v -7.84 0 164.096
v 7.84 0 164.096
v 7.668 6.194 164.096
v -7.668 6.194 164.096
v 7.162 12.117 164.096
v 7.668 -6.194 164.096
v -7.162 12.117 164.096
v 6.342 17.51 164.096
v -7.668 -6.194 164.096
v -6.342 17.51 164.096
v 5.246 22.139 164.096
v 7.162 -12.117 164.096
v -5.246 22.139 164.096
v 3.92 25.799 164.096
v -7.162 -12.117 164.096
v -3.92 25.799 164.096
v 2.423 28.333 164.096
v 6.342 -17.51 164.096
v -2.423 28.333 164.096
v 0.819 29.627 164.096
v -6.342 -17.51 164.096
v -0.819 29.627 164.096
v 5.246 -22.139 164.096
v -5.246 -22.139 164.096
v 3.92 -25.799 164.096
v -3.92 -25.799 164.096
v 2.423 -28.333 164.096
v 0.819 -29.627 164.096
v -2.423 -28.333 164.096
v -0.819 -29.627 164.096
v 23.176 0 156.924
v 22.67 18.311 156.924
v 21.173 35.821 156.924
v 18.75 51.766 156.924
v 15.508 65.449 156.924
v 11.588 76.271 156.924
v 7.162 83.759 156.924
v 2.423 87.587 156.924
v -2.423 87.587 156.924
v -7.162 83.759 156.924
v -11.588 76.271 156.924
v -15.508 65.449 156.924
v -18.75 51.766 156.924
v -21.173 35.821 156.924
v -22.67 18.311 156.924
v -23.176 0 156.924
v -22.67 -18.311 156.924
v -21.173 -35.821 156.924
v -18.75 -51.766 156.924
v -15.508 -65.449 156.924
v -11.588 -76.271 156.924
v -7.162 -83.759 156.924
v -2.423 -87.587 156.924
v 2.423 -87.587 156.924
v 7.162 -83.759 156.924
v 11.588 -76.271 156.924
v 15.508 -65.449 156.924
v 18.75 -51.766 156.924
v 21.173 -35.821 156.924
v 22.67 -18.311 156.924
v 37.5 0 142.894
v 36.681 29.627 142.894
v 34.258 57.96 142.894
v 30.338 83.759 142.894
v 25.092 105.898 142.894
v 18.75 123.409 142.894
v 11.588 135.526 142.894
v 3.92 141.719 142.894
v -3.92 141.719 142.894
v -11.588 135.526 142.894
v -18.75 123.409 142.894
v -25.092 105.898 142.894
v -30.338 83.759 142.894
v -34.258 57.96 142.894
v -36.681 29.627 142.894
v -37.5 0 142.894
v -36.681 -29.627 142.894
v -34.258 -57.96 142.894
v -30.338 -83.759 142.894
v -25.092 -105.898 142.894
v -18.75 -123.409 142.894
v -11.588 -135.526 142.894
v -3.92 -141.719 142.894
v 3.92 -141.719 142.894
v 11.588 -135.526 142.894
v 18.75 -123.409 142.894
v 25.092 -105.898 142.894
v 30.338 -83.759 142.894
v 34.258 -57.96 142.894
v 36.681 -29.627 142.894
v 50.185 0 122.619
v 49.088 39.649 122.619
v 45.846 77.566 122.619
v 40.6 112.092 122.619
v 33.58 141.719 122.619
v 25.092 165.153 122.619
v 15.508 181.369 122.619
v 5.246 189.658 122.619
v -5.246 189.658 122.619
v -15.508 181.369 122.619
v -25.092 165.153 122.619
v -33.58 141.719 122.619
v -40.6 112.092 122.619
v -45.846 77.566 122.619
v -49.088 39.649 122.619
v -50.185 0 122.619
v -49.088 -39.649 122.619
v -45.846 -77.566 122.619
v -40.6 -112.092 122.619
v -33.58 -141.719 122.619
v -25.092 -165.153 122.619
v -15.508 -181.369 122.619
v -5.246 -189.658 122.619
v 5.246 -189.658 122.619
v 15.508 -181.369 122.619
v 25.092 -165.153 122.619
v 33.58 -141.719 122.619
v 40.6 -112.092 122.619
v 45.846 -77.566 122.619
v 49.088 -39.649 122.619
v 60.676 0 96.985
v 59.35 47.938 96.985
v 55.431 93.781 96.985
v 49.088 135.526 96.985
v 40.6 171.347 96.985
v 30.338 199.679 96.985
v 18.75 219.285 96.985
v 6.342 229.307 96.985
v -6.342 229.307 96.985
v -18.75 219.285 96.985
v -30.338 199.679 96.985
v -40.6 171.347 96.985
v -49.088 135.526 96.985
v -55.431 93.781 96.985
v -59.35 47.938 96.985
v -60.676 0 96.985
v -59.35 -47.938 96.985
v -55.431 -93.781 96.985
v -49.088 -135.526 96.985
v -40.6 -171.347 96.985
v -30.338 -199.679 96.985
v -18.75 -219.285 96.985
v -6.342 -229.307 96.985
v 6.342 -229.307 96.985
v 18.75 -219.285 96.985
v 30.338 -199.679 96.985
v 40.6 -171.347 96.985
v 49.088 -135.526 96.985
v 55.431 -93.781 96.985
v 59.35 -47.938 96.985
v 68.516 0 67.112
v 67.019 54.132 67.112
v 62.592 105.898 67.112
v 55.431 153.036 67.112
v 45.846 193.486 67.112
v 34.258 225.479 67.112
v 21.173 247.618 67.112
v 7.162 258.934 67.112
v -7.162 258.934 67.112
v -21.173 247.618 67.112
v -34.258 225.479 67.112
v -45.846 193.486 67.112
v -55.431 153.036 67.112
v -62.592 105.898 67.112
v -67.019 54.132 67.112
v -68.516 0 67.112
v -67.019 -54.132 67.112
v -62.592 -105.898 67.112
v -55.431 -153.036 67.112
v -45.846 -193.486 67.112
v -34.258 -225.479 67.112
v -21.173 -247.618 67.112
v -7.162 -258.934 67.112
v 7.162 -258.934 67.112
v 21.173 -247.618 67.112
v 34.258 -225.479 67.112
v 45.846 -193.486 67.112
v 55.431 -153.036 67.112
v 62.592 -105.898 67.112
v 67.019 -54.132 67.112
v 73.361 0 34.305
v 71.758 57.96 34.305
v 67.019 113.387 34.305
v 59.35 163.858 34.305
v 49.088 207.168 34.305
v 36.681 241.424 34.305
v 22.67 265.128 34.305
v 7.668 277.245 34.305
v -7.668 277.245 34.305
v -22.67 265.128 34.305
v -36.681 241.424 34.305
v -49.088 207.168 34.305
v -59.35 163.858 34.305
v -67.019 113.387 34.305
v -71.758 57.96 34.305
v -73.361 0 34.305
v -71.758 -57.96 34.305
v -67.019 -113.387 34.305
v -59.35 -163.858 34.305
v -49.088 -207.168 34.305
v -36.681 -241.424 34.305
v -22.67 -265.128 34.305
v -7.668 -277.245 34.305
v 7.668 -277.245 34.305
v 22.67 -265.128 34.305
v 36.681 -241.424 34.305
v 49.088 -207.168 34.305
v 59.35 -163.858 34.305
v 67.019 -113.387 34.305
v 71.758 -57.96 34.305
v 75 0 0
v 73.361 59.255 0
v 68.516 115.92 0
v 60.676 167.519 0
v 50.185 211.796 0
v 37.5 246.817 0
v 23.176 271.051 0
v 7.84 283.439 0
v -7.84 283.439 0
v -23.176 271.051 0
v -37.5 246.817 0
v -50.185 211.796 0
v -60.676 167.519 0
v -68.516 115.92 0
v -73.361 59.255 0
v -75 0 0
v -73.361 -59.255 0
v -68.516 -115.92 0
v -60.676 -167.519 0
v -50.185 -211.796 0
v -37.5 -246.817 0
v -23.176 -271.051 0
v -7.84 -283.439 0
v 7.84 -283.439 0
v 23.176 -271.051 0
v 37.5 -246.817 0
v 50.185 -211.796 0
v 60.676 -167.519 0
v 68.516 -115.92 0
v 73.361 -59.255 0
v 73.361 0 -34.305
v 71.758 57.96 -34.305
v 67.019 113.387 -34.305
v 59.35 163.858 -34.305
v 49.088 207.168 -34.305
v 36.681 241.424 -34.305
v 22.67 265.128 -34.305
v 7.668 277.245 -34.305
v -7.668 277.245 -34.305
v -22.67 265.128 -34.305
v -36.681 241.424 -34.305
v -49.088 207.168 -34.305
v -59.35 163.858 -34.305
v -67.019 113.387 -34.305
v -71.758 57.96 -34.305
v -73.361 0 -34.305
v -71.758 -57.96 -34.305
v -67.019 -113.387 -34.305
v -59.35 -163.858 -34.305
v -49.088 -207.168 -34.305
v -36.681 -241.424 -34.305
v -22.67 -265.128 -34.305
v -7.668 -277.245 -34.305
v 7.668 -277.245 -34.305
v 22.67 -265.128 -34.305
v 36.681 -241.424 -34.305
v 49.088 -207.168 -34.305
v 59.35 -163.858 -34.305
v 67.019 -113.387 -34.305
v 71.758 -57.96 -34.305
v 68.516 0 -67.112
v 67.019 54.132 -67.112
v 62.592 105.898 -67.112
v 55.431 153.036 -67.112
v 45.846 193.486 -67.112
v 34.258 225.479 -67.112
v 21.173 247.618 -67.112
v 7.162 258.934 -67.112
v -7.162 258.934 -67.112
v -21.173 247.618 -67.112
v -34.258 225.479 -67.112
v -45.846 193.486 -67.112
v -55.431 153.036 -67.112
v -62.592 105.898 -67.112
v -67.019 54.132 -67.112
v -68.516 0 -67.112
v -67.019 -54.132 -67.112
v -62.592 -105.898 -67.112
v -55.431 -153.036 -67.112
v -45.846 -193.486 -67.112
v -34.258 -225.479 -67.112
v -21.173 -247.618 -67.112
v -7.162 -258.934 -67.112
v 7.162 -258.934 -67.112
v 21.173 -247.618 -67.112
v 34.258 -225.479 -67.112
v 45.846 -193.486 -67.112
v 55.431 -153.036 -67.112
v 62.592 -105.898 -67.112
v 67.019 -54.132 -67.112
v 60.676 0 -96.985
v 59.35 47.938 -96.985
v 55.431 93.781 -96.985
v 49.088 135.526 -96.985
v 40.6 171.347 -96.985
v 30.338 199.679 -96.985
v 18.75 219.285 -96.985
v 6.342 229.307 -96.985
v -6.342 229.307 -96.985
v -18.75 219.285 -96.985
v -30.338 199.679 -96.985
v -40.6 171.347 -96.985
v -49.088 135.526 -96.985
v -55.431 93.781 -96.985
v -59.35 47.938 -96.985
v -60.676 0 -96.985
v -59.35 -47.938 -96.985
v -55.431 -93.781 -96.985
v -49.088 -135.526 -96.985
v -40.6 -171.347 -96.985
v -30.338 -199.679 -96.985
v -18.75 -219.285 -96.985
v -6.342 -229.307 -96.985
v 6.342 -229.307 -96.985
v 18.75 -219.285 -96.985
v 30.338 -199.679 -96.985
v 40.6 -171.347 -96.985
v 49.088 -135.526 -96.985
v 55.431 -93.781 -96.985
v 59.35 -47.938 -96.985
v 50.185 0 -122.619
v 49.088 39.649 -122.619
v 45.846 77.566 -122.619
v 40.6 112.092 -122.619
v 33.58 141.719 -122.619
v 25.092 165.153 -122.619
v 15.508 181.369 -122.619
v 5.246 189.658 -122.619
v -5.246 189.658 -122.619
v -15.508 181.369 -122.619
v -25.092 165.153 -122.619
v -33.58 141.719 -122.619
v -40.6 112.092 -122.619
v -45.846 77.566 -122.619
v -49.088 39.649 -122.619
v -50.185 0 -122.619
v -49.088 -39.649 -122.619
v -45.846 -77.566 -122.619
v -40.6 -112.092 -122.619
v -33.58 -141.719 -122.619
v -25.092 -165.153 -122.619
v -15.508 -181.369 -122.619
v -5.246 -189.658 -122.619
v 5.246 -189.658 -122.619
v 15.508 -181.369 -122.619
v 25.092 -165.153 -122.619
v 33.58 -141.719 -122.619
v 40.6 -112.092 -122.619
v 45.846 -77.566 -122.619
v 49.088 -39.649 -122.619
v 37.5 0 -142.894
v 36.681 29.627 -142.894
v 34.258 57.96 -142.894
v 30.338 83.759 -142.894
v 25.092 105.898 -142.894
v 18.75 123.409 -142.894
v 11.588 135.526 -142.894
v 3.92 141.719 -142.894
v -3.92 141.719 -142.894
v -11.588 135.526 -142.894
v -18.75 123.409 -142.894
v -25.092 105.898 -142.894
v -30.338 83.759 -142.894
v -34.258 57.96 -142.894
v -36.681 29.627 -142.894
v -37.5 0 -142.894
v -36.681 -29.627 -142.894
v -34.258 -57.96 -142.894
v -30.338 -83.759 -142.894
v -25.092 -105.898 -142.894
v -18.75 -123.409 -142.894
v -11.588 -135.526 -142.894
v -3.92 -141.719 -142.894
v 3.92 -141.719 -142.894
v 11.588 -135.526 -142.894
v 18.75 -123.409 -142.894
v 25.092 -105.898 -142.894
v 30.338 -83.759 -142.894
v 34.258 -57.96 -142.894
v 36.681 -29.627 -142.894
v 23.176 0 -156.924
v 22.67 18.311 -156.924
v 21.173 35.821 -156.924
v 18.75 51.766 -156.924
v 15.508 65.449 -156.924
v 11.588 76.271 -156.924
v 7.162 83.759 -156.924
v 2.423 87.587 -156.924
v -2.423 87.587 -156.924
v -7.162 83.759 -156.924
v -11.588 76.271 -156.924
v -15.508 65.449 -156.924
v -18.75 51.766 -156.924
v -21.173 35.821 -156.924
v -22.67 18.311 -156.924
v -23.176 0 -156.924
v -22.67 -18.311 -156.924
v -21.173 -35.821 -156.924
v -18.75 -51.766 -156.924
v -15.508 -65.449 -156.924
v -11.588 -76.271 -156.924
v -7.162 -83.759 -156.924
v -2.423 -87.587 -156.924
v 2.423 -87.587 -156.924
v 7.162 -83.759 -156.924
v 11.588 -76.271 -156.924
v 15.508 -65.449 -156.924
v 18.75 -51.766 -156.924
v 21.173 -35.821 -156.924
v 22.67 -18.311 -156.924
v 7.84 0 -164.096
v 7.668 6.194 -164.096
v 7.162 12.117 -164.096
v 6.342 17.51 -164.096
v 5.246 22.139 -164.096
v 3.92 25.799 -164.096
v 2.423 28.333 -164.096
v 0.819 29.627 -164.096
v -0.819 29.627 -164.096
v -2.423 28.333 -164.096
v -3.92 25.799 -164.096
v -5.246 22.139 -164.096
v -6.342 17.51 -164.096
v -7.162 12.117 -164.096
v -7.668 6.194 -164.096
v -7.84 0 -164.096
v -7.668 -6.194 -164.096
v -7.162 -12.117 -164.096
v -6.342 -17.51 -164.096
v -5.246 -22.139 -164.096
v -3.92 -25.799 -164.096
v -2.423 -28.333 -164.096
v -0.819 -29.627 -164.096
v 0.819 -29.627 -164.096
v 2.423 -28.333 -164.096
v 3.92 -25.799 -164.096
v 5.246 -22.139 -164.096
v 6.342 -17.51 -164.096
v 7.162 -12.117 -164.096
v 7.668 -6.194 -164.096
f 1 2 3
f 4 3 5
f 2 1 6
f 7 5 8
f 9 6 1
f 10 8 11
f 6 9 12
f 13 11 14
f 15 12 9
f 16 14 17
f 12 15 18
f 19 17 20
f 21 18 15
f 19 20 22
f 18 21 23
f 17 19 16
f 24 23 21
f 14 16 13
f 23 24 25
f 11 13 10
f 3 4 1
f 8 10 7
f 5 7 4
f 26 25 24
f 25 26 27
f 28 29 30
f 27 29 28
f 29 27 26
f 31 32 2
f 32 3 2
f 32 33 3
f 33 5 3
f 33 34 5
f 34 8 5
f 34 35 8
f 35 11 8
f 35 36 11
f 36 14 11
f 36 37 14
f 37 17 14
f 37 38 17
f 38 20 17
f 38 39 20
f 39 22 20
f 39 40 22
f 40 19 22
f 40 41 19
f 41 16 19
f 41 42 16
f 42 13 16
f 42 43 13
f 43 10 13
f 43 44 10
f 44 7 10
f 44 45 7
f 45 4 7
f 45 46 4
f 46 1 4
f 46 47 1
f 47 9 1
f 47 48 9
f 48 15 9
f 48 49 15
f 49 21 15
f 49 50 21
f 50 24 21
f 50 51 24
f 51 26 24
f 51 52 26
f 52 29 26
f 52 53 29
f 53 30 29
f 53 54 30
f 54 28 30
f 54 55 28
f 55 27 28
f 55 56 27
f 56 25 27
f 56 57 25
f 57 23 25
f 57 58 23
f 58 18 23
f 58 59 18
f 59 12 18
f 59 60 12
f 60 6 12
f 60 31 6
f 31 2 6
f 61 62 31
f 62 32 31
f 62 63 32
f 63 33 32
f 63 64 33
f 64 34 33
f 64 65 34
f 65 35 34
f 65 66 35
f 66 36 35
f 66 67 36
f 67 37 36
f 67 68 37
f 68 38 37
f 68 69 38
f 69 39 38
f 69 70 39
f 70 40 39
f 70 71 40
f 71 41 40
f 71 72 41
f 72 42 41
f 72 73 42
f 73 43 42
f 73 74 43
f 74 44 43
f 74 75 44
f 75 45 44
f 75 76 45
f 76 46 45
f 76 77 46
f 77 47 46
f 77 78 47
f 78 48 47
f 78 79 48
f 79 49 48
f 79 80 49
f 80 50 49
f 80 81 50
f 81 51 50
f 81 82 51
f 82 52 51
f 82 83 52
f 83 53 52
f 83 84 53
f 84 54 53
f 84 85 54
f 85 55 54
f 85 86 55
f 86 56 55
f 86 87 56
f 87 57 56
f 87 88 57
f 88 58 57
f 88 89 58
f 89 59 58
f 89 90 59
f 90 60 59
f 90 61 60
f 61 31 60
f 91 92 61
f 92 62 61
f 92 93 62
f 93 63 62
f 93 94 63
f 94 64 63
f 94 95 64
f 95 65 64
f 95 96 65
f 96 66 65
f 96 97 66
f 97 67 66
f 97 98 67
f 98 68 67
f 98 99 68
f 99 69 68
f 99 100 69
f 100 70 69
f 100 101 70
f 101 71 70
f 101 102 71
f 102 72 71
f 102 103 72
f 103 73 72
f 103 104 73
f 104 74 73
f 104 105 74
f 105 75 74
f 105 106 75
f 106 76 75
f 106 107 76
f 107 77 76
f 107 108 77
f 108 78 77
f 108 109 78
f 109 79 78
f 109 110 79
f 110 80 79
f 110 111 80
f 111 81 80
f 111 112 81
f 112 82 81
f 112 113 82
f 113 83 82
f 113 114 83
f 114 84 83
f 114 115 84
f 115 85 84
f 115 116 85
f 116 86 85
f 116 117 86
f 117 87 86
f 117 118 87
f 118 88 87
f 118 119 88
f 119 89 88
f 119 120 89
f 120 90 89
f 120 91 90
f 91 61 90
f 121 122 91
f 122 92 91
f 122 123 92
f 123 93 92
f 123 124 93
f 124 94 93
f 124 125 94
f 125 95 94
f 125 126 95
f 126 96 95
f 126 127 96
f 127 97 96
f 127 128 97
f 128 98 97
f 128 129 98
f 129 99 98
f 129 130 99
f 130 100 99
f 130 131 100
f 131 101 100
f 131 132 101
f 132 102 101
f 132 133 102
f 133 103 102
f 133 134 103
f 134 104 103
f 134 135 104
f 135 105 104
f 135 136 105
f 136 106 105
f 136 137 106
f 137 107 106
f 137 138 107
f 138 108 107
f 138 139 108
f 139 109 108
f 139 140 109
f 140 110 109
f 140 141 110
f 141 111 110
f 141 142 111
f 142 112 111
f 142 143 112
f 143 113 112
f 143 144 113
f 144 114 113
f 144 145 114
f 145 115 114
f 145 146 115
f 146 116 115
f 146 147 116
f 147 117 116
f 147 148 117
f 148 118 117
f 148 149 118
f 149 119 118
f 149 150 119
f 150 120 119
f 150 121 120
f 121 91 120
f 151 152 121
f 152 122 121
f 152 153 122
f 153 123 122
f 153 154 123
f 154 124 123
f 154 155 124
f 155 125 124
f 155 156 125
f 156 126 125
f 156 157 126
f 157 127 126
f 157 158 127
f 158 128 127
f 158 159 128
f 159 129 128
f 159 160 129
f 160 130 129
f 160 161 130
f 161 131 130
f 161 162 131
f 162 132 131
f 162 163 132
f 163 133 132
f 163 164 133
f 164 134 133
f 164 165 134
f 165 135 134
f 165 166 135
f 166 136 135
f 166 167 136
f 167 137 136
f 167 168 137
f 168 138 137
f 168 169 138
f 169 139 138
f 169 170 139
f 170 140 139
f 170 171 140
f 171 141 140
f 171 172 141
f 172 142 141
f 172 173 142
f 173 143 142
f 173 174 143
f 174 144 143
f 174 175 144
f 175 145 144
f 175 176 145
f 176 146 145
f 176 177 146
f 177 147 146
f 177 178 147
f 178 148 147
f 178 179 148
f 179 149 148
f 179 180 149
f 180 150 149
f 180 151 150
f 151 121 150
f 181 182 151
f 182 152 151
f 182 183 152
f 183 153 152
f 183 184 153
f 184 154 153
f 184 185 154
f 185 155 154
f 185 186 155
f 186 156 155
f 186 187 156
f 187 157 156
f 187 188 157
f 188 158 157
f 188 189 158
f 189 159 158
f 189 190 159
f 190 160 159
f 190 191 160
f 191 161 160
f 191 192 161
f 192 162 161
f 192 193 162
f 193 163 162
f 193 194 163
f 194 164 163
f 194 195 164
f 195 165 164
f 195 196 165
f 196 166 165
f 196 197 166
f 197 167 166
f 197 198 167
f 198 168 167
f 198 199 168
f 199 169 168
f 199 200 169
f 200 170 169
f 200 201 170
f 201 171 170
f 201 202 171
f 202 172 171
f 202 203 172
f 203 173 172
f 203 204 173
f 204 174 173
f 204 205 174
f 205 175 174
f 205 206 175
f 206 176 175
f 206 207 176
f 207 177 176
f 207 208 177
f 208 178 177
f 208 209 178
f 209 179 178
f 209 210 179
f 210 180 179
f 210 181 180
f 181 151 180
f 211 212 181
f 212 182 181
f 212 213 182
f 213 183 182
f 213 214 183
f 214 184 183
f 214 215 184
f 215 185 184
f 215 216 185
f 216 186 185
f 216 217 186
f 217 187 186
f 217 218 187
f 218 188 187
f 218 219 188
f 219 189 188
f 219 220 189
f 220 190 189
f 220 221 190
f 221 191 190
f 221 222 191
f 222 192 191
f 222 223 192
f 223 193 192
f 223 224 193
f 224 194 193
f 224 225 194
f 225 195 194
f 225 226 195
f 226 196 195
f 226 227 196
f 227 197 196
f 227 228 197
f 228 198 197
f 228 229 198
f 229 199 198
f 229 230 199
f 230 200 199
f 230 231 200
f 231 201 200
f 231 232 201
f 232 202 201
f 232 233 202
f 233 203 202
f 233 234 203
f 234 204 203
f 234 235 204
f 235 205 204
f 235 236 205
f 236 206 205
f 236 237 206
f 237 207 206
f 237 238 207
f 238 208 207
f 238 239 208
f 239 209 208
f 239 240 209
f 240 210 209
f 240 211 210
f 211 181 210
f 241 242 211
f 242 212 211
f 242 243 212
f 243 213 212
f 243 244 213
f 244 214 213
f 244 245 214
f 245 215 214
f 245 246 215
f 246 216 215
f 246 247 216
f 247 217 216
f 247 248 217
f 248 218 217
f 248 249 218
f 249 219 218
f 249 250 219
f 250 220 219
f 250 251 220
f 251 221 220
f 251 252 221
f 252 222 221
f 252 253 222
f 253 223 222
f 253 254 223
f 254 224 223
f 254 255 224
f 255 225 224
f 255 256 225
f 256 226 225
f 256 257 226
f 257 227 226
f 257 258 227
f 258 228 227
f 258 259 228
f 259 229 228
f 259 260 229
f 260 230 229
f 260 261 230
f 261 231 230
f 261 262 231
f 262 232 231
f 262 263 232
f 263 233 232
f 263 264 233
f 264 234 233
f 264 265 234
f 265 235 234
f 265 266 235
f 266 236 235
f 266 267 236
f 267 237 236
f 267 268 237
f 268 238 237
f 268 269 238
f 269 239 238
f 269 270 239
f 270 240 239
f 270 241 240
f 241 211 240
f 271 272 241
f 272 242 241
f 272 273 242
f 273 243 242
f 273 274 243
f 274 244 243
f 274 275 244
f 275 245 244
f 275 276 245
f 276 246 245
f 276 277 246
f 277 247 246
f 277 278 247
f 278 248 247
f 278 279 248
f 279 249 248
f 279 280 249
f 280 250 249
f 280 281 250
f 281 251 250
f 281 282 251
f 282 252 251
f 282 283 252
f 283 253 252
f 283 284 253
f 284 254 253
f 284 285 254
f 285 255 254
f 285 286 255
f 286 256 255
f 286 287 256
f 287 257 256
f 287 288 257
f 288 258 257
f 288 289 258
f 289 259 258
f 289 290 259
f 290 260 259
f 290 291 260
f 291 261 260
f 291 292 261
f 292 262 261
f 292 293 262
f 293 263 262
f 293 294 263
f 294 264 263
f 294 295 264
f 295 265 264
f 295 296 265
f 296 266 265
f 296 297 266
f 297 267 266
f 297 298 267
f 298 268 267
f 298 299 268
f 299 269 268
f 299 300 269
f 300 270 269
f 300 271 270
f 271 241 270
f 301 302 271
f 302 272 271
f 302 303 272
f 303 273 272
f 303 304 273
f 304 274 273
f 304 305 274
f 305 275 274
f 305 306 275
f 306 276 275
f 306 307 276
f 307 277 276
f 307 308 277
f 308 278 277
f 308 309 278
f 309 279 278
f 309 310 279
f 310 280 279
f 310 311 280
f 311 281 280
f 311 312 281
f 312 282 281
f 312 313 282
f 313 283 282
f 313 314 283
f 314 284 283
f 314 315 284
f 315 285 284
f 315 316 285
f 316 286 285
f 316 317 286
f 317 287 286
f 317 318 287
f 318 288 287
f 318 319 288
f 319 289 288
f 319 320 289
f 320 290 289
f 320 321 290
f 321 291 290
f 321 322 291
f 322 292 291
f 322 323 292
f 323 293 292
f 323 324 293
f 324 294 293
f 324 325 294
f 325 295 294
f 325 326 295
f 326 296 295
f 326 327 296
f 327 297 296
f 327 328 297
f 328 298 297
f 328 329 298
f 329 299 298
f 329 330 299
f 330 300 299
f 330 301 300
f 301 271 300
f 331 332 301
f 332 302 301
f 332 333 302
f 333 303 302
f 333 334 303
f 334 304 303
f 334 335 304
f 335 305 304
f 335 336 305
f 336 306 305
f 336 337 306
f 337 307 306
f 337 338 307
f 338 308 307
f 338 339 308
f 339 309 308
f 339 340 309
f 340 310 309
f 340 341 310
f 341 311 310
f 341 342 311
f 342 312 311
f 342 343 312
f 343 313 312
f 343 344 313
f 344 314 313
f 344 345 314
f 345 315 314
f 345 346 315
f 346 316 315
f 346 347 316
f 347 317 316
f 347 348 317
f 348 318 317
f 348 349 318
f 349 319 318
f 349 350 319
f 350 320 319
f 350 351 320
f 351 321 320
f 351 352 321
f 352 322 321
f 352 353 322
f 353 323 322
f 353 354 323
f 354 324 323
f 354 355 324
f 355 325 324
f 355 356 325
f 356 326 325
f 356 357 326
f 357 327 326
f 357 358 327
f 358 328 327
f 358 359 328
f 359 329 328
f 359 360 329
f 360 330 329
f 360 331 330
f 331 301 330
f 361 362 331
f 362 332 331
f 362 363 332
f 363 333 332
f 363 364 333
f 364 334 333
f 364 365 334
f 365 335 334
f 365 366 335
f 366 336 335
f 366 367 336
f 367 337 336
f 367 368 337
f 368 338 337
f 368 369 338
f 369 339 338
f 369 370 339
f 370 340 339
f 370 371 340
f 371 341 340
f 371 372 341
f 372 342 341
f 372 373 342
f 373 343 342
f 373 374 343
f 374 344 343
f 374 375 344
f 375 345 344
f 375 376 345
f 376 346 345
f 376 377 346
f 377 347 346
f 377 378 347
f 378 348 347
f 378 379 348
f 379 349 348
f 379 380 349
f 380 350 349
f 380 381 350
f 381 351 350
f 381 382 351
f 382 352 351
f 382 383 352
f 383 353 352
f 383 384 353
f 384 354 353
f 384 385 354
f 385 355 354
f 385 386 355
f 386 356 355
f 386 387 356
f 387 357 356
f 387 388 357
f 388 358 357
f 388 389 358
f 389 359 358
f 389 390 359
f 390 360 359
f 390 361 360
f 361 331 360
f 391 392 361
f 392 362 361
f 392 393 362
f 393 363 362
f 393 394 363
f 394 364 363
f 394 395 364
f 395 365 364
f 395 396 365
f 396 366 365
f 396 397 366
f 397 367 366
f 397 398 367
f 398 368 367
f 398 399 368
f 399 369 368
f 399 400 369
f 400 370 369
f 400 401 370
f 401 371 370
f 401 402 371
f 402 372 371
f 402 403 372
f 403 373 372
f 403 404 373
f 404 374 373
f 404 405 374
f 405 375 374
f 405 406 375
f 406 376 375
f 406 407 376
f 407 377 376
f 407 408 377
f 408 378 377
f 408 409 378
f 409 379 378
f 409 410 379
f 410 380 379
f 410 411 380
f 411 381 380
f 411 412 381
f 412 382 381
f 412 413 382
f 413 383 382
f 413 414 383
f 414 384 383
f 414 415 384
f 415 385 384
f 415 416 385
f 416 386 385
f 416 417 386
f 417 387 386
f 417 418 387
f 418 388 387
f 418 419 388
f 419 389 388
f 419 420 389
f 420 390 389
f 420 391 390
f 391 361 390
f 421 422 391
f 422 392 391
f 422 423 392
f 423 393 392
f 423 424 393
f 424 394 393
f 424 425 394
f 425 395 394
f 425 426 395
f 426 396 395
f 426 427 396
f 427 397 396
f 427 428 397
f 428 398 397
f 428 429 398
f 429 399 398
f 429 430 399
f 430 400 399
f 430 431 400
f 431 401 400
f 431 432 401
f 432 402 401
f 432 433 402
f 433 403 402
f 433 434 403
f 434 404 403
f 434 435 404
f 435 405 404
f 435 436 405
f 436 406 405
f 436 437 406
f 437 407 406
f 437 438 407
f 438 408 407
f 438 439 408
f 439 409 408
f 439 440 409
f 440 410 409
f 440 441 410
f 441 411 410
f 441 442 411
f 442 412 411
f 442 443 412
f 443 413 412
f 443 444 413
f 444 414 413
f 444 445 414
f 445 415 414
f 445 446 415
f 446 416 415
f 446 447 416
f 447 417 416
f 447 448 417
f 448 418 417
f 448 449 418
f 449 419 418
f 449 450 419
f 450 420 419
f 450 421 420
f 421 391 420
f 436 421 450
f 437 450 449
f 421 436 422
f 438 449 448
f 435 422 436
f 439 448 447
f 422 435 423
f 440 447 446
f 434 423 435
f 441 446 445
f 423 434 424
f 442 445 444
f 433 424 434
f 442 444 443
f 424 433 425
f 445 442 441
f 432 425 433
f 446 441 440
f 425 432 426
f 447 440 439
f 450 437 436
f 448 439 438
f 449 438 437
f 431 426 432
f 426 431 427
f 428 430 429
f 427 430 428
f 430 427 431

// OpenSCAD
// Generated by SolidPython 1.0.1 on 2020-07-29 00:46:47


scale(v = [5, 19, 11]) {
	sphere(r = 15);
}
/***********************************************
*********      SolidPython code:      **********
************************************************
 
# import packages: SolidPython
from solid import *
from solid.utils import *
from itertools import chain, combinations, permutations


class Resize:

    def __init__(self, scad_file):
        self.scad_file = scad_file
        #self.scad_file = import_scad(scad_file)
        # cone/cylinder param:
        self.r1 = 0
        self.r2 = 0
        self.h = 0
        # rectangular prism param:
        self.w = 0
        self.l = 0
        # ellipse param:
        self.r = 0

    # import OpenScad code (file name corresponds to shape)


    # classify shape + parameters
    def assign(self, param1, param2, param3):
        if self.scad_file == 'cone.scad':
            self.r1 = param1
            self.r2 = param2
            self.h = param3
        elif self.scad_file == 'cylinder.scad':
            self.r1 = param1
            self.r2 = param2
            self.h = param3
        elif self.scad_file == 'rectangularPrism.scad':
            self.h = param1
            self.l = param2
            self.w = param3
        else:
            self.r = param1
            self.h = param2

    # resize parameters
    def iterate(self):
        x = range(3, 20, 2)
        i = 1
        if self.scad_file == 'cone.scad':
            tempList = list(permutations(x, 2))
            for temp in tempList:
                param1 = temp[0]
                param2 = temp[1]
                filepath = 'produced_scad_files/' + 'cone' + str(param1) + '_' + str(param2) + '_' + '.scad'
                scad_render_to_file(cylinder(h=param1, r1=param2, r2=0), filepath)

        elif self.scad_file == 'cylinder.scad':
            tempList = list(permutations(x, 3))
            for temp in tempList:
                param1 = temp[0]
                param2 = temp[1]
                filepath = 'produced_scad_files/' + 'cylinder' + str(param1) + '_' + str(param2) + '_' + '.scad'
                scad_render_to_file(cylinder(h=param1, r1=param2, r2=param2), filepath)

        elif self.scad_file == 'rectangularPrism.scad':
            tempList = list(permutations(x, 3))
            for temp in tempList:
                param1 = temp[0]
                param2 = temp[1]
                param3 = temp[2]
                filepath = 'produced_scad_files/' + 'rectangularPrism' + str(param1) + '_' + str(param2) + '_' + str(
                    param3) + '.scad'
                scad_render_to_file(cube(size=(param1, param2, param3)), filepath)

        elif self.scad_file == 'ellipse.scad':
            tempList = list(permutations(x, 4))
            for temp in tempList:
                param1 = temp[0]
                param2 = temp[1]
                param3 = temp[2]
                param4 = temp[3]
                filepath = 'produced_scad_files/' + 'ellipse' + str(param1) + '_' + str(param2) + '_' + str(param3) + '_' + str(param4) + '.scad'
                scad_render_to_file(scale([param1, param2, param3])(sphere(r=param4)), filepath)

    def render_to_scadfile(self):
        scad_render_to_file(scad, 'example.scad') 
 
************************************************/
